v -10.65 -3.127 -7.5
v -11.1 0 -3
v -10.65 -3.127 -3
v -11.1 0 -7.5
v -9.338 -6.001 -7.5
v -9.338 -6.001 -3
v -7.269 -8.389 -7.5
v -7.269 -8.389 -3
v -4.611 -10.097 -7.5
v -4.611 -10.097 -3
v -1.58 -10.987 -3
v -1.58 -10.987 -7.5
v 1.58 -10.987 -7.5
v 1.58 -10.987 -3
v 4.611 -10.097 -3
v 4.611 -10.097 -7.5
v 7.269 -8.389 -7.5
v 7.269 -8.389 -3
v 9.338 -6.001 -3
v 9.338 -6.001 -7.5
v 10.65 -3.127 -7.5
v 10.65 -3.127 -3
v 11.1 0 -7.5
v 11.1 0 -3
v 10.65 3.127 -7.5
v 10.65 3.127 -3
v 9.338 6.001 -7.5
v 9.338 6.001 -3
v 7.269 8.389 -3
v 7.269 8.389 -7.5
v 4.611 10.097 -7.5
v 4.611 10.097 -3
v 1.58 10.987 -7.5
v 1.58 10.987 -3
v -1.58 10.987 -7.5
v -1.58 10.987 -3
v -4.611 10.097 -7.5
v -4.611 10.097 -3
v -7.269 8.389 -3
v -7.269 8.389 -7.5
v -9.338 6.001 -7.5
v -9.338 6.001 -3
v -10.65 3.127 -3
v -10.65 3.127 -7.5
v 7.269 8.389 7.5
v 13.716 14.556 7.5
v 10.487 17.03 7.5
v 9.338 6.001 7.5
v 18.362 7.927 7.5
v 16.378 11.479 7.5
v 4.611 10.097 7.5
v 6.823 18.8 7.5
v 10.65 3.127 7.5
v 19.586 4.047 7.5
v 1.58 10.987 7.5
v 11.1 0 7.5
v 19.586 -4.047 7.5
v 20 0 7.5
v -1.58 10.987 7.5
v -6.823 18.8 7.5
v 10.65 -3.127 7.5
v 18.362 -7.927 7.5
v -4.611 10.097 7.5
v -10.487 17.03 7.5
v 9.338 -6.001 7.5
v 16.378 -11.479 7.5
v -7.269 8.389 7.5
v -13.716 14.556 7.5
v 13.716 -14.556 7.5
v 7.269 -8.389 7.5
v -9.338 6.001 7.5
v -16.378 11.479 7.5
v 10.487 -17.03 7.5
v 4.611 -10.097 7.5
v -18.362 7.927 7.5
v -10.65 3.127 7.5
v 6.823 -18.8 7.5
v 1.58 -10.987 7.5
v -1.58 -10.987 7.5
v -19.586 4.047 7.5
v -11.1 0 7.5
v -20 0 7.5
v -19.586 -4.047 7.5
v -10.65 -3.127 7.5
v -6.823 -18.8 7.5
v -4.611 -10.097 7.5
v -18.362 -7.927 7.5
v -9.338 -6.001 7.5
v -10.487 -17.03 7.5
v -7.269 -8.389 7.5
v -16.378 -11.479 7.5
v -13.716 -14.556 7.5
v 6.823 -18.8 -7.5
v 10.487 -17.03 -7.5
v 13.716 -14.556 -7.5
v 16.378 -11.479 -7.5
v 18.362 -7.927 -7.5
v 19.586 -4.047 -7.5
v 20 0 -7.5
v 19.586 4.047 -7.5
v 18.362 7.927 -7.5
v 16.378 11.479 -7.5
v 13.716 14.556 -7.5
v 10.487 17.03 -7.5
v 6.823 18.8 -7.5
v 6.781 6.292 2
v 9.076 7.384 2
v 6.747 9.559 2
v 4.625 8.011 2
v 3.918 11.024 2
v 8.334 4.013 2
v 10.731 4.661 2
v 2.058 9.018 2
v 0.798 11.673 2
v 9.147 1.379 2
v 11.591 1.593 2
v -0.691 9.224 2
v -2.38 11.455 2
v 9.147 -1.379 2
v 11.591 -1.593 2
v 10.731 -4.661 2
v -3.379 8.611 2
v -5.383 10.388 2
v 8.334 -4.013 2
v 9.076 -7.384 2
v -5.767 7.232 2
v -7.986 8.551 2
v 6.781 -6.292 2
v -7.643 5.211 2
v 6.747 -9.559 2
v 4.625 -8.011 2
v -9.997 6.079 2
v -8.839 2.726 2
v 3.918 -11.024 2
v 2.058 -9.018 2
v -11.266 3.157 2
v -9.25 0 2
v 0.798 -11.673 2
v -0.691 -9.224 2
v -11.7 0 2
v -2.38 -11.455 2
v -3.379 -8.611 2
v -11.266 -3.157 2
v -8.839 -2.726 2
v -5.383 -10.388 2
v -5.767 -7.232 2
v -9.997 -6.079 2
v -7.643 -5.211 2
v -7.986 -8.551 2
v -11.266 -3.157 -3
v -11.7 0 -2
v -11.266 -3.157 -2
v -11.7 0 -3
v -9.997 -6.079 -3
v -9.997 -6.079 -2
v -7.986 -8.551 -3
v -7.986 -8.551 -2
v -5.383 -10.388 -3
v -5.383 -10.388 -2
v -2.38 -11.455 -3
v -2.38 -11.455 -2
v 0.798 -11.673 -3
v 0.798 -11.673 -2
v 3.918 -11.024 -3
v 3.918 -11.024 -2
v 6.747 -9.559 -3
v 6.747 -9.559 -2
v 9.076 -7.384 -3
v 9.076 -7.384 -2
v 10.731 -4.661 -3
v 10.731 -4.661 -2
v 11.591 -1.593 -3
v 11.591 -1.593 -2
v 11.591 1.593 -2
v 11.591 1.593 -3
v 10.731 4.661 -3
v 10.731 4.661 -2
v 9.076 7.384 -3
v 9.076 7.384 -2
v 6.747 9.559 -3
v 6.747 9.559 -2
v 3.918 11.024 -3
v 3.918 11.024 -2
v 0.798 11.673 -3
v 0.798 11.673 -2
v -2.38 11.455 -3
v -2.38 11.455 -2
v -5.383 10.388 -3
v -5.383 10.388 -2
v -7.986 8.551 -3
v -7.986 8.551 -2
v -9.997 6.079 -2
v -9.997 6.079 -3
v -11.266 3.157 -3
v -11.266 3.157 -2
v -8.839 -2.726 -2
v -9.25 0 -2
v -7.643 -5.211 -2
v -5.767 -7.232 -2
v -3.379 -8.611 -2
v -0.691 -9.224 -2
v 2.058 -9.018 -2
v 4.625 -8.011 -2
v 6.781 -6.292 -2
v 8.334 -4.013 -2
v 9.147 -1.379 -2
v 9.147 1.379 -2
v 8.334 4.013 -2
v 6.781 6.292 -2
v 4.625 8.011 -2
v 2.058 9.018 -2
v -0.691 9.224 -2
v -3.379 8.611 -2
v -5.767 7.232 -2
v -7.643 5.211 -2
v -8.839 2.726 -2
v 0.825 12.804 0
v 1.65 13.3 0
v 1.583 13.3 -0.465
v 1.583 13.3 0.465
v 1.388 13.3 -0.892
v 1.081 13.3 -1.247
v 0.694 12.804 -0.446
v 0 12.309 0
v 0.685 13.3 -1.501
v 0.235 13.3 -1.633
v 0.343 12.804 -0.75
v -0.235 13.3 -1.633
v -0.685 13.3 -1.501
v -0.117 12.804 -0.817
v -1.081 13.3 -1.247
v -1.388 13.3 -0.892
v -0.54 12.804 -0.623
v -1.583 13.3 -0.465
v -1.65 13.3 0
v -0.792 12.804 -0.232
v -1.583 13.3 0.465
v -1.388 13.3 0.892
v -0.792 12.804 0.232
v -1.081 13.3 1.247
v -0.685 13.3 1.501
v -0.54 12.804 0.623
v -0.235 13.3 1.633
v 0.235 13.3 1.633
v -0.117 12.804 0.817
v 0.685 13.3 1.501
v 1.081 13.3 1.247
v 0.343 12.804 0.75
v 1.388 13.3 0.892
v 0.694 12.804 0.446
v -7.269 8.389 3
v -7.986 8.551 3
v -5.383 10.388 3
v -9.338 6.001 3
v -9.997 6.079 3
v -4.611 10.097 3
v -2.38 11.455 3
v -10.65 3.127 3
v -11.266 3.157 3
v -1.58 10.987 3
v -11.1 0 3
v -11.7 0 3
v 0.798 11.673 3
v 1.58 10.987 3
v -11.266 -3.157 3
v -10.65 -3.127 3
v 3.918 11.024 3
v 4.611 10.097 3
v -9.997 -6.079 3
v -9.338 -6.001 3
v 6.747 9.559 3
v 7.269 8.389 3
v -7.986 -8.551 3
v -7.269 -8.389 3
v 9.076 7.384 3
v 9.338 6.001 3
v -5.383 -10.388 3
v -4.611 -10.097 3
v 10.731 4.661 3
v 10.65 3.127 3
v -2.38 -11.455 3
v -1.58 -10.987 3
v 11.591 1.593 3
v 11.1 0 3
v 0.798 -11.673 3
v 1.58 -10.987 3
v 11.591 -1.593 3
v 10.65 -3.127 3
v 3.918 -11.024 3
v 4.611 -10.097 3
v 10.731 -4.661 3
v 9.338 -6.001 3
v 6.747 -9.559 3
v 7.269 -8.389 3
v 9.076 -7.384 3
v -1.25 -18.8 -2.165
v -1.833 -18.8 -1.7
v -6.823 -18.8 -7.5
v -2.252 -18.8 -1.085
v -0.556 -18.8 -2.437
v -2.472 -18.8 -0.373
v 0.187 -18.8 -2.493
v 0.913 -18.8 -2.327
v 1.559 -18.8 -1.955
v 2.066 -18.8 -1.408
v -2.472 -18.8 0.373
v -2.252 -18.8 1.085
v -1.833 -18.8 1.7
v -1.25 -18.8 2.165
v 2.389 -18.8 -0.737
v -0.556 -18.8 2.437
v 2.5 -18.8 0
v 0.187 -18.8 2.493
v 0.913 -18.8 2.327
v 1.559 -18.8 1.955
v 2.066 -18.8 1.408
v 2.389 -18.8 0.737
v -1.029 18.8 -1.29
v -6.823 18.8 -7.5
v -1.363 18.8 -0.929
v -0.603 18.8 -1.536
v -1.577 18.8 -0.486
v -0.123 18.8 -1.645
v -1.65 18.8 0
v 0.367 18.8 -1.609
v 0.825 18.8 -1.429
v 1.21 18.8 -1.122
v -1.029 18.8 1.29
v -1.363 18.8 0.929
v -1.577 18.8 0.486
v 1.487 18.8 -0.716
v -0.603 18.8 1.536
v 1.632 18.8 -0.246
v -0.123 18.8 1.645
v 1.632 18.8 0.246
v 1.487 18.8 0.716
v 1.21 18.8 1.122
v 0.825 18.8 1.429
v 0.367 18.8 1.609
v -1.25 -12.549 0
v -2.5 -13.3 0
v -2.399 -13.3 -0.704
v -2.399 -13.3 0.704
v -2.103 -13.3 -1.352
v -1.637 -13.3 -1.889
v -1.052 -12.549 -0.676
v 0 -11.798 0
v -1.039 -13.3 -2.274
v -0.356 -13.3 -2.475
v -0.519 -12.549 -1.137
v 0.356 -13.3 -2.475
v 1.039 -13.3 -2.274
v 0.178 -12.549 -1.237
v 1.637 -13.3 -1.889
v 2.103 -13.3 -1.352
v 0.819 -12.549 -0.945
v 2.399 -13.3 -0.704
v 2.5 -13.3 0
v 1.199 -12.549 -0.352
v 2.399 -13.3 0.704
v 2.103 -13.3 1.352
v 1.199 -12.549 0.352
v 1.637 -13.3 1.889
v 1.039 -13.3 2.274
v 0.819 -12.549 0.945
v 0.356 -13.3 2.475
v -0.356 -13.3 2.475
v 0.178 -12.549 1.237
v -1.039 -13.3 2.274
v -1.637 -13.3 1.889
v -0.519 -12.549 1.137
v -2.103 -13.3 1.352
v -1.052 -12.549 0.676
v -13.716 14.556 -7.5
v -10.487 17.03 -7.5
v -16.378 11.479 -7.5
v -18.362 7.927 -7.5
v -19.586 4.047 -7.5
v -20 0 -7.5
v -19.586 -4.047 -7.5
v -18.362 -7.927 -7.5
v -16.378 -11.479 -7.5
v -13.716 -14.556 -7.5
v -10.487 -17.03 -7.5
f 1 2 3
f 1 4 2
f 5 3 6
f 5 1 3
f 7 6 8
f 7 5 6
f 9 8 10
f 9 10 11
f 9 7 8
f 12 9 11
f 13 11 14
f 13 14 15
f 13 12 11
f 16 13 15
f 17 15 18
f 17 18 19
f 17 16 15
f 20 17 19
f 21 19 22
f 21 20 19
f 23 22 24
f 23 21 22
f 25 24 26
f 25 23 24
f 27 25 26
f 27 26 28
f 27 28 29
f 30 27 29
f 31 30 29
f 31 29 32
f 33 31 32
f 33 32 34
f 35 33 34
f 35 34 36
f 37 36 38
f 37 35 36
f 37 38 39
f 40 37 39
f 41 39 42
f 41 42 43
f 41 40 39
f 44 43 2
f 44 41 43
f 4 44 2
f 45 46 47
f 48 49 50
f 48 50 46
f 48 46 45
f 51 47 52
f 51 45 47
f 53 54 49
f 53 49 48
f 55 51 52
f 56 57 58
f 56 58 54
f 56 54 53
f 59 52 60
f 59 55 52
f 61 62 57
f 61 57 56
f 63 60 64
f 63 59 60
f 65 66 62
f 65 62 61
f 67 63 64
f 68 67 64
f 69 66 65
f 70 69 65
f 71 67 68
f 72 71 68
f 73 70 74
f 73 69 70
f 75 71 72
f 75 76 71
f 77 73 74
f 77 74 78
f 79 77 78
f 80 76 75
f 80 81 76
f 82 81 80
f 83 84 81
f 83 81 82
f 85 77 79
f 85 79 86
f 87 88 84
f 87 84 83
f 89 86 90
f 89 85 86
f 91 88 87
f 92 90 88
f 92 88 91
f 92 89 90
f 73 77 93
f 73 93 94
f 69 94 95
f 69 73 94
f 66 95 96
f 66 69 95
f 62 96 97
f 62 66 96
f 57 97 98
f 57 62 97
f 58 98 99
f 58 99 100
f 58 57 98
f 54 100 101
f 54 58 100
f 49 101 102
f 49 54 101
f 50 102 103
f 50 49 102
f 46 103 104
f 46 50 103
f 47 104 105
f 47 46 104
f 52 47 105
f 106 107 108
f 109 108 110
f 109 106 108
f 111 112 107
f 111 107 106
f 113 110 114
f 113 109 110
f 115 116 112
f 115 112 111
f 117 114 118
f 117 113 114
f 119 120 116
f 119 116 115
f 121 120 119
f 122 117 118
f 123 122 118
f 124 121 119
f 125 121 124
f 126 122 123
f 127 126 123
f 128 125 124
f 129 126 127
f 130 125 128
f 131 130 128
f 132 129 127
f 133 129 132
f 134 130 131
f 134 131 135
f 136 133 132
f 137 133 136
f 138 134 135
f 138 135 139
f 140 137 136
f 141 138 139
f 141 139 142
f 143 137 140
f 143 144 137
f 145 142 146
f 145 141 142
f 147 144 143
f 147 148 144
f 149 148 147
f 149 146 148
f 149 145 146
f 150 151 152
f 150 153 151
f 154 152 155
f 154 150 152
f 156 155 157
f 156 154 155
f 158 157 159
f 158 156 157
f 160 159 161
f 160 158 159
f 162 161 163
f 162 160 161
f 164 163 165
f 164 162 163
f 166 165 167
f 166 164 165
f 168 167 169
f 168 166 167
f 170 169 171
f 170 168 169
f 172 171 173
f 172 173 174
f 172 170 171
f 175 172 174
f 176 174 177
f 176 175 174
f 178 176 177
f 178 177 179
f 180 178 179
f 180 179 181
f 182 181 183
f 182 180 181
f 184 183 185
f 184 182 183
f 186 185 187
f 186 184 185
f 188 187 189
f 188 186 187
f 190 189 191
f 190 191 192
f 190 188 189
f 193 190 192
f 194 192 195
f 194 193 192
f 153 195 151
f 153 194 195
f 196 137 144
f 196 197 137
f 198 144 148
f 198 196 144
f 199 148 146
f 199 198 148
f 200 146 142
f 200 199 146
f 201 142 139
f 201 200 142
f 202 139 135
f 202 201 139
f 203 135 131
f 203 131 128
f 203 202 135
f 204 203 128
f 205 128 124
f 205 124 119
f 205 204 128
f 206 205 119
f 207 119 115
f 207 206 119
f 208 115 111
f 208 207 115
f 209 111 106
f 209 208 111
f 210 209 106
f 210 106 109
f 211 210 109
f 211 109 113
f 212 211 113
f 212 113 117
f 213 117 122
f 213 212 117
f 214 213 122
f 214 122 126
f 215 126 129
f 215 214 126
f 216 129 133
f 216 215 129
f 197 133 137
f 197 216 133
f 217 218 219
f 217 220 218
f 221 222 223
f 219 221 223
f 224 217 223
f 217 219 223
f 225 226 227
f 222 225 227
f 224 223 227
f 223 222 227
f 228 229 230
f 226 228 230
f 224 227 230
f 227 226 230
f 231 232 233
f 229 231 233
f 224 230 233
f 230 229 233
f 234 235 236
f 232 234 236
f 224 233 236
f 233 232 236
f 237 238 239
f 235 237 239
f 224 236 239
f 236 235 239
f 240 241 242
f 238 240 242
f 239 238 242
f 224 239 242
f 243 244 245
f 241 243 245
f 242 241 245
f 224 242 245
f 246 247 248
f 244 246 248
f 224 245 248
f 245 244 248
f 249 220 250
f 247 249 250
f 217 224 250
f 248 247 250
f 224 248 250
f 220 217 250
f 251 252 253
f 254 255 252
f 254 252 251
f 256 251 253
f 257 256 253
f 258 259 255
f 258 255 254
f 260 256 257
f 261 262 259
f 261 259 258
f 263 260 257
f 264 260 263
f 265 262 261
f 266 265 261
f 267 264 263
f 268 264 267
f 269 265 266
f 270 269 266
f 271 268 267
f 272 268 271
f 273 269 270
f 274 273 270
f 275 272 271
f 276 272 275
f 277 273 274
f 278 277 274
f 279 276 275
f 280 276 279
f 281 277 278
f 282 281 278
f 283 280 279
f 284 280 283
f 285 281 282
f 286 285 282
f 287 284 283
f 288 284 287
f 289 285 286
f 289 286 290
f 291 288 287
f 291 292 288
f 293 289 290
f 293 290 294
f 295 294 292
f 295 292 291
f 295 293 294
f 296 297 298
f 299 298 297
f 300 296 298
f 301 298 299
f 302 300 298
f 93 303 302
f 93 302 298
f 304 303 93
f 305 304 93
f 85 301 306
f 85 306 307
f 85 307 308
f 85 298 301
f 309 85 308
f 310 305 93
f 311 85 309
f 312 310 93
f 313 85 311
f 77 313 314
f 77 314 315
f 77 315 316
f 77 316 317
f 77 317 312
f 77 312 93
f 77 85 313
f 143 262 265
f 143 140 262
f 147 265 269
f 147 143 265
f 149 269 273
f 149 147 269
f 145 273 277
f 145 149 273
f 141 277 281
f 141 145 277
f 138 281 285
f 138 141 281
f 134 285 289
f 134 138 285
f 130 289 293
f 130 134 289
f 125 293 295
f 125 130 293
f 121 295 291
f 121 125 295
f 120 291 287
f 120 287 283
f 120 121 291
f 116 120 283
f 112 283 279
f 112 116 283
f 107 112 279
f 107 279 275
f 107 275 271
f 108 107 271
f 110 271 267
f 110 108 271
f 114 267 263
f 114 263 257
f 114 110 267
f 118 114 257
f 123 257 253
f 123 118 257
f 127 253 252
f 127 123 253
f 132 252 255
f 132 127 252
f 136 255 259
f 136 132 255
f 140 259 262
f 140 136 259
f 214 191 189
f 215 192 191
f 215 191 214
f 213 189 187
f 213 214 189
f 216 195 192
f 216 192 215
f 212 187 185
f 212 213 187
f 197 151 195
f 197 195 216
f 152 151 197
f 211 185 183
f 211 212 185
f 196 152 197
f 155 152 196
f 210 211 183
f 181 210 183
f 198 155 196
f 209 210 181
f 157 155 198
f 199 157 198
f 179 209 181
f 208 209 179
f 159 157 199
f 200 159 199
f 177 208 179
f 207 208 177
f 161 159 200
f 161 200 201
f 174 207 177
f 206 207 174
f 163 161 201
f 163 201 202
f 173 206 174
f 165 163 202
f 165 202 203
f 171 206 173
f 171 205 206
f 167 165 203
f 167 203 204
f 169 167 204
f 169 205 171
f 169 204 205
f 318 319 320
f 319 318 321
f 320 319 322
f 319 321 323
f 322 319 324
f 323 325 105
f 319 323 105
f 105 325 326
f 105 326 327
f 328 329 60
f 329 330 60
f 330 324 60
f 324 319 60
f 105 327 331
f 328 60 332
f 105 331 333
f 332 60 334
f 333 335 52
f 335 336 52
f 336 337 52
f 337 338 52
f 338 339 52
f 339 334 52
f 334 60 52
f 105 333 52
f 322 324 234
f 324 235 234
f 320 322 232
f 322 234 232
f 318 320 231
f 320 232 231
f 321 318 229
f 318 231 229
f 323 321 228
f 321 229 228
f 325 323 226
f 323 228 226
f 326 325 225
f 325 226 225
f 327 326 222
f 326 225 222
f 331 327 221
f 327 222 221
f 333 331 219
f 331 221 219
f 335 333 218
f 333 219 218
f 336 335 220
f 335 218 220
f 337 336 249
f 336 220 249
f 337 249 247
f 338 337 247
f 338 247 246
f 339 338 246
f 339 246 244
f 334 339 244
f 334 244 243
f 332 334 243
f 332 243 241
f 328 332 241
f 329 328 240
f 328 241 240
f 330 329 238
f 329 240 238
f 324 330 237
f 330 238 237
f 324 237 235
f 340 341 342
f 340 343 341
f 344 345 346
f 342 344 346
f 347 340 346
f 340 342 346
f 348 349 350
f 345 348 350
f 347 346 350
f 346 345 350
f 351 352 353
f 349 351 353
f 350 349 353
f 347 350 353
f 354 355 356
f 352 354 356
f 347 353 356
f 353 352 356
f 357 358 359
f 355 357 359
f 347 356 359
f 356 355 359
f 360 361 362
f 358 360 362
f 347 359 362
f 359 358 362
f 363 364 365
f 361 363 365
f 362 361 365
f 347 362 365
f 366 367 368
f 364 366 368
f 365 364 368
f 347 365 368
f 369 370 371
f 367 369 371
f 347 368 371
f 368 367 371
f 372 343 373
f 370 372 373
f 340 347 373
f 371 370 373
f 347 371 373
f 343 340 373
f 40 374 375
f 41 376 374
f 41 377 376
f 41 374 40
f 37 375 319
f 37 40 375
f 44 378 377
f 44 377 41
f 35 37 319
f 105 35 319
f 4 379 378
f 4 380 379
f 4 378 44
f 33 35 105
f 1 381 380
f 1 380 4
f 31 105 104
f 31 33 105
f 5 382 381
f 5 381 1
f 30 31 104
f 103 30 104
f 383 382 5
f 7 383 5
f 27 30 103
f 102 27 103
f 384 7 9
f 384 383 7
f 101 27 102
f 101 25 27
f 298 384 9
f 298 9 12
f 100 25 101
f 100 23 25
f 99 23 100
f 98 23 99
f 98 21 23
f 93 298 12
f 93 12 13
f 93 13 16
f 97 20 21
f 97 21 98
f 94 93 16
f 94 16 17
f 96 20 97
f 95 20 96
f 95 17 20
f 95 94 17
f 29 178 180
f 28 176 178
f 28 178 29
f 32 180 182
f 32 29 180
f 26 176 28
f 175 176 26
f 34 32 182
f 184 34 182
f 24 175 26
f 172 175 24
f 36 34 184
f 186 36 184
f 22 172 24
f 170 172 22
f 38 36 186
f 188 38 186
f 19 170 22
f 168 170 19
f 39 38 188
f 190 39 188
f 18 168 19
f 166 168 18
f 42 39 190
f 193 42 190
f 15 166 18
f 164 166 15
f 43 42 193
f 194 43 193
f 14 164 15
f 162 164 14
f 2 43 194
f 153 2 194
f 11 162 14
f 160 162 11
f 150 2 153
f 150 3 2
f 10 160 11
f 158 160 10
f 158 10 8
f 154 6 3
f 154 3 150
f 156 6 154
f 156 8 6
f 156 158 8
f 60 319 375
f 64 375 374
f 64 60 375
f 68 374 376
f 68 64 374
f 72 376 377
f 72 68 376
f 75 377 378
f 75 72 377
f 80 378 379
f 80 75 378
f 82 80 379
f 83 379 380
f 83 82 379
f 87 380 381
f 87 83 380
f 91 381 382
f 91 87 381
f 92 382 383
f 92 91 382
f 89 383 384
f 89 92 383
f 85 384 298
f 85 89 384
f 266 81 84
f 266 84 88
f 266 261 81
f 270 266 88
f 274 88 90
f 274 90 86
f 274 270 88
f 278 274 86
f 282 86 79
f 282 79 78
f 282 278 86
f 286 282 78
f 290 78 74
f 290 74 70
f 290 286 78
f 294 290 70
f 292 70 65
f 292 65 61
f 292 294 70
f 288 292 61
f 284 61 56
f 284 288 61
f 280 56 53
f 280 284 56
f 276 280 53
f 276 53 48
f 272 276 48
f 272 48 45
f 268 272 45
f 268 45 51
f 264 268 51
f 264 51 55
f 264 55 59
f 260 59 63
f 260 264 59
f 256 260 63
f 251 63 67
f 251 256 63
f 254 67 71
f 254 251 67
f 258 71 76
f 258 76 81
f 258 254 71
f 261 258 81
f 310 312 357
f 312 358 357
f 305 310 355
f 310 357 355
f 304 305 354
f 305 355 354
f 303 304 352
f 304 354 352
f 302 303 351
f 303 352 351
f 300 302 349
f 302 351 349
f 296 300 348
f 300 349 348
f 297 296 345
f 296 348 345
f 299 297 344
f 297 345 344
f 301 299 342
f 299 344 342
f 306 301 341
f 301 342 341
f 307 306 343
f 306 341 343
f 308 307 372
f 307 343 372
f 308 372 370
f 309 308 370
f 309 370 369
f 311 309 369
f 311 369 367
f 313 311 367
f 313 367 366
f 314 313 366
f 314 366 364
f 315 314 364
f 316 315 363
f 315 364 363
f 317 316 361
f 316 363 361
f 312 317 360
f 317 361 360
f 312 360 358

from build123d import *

# Parameters (mm, degrees)
SKETCH_2_W             = 64.02174429
SKETCH_2_H             = 9.248919907
CUT_EXTRUDE_1_DEPTH    = 49
HOLE_WIZARD_M4_2_D     = 3.3
HOLE_WIZARD_M4_2_DEPTH = 5.5
HOLE_WIZARD_M4_2_TIP   = 0.991420021
HOLE_WIZARD_M6_2_D     = 5
HOLE_WIZARD_M6_2_DEPTH = 5.5
HOLE_WIZARD_M6_2_TIP   = 1.502151548


with BuildPart() as part:
    # 草图1 → 旋转1 (revolve)
    with BuildSketch(Plane(origin=(0, 0, 0), x_dir=(1, 0, 0), z_dir=(0, 1, 0)), mode=Mode.PRIVATE) as revolve_1_sk:
        Polygon((20, 7.5), (20, -7.5), (11.1, -7.5), (11.1, -3), (11.7, -3), (11.7, -2), (9.25, -2), (9.25, 2), (11.7, 2), (11.7, 3), (11.1, 3), (11.1, 7.5), align=None)
    revolve(revolve_1_sk.sketch.rotate(Axis((0, 0, -31.9390681), (0, 0, 1)), 180), axis=Axis((0, 0, -31.9390681), (0, 0, 1)))  # turned: the seam where the file's is

    # 草图2 → 切除-拉伸1 (cut)
    with BuildSketch(Plane.XY.offset(7.5)):
        with Locations((-1.141100508, 23.424459954)):
            Rectangle(SKETCH_2_W, SKETCH_2_H)
        with Locations((-1.141100508, -23.424459954)):
            Rectangle(SKETCH_2_W, SKETCH_2_H)
    extrude(amount=-CUT_EXTRUDE_1_DEPTH, mode=Mode.SUBTRACT)

    # M4 螺纹孔2
    with Locations(Plane(origin=(0, 18.8, 0), x_dir=(1, 0, 0), z_dir=(0, 1, 0))):
        with Locations((0, 0)):
            Hole(HOLE_WIZARD_M4_2_D / 2, depth=HOLE_WIZARD_M4_2_DEPTH)
            with Locations((0, 0, -(HOLE_WIZARD_M4_2_DEPTH + HOLE_WIZARD_M4_2_TIP / 2))):  # 118° drill point
                Cone(0, HOLE_WIZARD_M4_2_D / 2, HOLE_WIZARD_M4_2_TIP, mode=Mode.SUBTRACT)

    # M6 螺纹孔2
    with Locations(Plane(origin=(0, -18.8, 0), x_dir=(-1, 0, 0), z_dir=(0, -1, 0))):
        with Locations((0, 0)):
            Hole(HOLE_WIZARD_M6_2_D / 2, depth=HOLE_WIZARD_M6_2_DEPTH)
            with Locations((0, 0, -(HOLE_WIZARD_M6_2_DEPTH + HOLE_WIZARD_M6_2_TIP / 2))):  # 118° drill point
                Cone(0, HOLE_WIZARD_M6_2_D / 2, HOLE_WIZARD_M6_2_TIP, mode=Mode.SUBTRACT)


solid = part.part
